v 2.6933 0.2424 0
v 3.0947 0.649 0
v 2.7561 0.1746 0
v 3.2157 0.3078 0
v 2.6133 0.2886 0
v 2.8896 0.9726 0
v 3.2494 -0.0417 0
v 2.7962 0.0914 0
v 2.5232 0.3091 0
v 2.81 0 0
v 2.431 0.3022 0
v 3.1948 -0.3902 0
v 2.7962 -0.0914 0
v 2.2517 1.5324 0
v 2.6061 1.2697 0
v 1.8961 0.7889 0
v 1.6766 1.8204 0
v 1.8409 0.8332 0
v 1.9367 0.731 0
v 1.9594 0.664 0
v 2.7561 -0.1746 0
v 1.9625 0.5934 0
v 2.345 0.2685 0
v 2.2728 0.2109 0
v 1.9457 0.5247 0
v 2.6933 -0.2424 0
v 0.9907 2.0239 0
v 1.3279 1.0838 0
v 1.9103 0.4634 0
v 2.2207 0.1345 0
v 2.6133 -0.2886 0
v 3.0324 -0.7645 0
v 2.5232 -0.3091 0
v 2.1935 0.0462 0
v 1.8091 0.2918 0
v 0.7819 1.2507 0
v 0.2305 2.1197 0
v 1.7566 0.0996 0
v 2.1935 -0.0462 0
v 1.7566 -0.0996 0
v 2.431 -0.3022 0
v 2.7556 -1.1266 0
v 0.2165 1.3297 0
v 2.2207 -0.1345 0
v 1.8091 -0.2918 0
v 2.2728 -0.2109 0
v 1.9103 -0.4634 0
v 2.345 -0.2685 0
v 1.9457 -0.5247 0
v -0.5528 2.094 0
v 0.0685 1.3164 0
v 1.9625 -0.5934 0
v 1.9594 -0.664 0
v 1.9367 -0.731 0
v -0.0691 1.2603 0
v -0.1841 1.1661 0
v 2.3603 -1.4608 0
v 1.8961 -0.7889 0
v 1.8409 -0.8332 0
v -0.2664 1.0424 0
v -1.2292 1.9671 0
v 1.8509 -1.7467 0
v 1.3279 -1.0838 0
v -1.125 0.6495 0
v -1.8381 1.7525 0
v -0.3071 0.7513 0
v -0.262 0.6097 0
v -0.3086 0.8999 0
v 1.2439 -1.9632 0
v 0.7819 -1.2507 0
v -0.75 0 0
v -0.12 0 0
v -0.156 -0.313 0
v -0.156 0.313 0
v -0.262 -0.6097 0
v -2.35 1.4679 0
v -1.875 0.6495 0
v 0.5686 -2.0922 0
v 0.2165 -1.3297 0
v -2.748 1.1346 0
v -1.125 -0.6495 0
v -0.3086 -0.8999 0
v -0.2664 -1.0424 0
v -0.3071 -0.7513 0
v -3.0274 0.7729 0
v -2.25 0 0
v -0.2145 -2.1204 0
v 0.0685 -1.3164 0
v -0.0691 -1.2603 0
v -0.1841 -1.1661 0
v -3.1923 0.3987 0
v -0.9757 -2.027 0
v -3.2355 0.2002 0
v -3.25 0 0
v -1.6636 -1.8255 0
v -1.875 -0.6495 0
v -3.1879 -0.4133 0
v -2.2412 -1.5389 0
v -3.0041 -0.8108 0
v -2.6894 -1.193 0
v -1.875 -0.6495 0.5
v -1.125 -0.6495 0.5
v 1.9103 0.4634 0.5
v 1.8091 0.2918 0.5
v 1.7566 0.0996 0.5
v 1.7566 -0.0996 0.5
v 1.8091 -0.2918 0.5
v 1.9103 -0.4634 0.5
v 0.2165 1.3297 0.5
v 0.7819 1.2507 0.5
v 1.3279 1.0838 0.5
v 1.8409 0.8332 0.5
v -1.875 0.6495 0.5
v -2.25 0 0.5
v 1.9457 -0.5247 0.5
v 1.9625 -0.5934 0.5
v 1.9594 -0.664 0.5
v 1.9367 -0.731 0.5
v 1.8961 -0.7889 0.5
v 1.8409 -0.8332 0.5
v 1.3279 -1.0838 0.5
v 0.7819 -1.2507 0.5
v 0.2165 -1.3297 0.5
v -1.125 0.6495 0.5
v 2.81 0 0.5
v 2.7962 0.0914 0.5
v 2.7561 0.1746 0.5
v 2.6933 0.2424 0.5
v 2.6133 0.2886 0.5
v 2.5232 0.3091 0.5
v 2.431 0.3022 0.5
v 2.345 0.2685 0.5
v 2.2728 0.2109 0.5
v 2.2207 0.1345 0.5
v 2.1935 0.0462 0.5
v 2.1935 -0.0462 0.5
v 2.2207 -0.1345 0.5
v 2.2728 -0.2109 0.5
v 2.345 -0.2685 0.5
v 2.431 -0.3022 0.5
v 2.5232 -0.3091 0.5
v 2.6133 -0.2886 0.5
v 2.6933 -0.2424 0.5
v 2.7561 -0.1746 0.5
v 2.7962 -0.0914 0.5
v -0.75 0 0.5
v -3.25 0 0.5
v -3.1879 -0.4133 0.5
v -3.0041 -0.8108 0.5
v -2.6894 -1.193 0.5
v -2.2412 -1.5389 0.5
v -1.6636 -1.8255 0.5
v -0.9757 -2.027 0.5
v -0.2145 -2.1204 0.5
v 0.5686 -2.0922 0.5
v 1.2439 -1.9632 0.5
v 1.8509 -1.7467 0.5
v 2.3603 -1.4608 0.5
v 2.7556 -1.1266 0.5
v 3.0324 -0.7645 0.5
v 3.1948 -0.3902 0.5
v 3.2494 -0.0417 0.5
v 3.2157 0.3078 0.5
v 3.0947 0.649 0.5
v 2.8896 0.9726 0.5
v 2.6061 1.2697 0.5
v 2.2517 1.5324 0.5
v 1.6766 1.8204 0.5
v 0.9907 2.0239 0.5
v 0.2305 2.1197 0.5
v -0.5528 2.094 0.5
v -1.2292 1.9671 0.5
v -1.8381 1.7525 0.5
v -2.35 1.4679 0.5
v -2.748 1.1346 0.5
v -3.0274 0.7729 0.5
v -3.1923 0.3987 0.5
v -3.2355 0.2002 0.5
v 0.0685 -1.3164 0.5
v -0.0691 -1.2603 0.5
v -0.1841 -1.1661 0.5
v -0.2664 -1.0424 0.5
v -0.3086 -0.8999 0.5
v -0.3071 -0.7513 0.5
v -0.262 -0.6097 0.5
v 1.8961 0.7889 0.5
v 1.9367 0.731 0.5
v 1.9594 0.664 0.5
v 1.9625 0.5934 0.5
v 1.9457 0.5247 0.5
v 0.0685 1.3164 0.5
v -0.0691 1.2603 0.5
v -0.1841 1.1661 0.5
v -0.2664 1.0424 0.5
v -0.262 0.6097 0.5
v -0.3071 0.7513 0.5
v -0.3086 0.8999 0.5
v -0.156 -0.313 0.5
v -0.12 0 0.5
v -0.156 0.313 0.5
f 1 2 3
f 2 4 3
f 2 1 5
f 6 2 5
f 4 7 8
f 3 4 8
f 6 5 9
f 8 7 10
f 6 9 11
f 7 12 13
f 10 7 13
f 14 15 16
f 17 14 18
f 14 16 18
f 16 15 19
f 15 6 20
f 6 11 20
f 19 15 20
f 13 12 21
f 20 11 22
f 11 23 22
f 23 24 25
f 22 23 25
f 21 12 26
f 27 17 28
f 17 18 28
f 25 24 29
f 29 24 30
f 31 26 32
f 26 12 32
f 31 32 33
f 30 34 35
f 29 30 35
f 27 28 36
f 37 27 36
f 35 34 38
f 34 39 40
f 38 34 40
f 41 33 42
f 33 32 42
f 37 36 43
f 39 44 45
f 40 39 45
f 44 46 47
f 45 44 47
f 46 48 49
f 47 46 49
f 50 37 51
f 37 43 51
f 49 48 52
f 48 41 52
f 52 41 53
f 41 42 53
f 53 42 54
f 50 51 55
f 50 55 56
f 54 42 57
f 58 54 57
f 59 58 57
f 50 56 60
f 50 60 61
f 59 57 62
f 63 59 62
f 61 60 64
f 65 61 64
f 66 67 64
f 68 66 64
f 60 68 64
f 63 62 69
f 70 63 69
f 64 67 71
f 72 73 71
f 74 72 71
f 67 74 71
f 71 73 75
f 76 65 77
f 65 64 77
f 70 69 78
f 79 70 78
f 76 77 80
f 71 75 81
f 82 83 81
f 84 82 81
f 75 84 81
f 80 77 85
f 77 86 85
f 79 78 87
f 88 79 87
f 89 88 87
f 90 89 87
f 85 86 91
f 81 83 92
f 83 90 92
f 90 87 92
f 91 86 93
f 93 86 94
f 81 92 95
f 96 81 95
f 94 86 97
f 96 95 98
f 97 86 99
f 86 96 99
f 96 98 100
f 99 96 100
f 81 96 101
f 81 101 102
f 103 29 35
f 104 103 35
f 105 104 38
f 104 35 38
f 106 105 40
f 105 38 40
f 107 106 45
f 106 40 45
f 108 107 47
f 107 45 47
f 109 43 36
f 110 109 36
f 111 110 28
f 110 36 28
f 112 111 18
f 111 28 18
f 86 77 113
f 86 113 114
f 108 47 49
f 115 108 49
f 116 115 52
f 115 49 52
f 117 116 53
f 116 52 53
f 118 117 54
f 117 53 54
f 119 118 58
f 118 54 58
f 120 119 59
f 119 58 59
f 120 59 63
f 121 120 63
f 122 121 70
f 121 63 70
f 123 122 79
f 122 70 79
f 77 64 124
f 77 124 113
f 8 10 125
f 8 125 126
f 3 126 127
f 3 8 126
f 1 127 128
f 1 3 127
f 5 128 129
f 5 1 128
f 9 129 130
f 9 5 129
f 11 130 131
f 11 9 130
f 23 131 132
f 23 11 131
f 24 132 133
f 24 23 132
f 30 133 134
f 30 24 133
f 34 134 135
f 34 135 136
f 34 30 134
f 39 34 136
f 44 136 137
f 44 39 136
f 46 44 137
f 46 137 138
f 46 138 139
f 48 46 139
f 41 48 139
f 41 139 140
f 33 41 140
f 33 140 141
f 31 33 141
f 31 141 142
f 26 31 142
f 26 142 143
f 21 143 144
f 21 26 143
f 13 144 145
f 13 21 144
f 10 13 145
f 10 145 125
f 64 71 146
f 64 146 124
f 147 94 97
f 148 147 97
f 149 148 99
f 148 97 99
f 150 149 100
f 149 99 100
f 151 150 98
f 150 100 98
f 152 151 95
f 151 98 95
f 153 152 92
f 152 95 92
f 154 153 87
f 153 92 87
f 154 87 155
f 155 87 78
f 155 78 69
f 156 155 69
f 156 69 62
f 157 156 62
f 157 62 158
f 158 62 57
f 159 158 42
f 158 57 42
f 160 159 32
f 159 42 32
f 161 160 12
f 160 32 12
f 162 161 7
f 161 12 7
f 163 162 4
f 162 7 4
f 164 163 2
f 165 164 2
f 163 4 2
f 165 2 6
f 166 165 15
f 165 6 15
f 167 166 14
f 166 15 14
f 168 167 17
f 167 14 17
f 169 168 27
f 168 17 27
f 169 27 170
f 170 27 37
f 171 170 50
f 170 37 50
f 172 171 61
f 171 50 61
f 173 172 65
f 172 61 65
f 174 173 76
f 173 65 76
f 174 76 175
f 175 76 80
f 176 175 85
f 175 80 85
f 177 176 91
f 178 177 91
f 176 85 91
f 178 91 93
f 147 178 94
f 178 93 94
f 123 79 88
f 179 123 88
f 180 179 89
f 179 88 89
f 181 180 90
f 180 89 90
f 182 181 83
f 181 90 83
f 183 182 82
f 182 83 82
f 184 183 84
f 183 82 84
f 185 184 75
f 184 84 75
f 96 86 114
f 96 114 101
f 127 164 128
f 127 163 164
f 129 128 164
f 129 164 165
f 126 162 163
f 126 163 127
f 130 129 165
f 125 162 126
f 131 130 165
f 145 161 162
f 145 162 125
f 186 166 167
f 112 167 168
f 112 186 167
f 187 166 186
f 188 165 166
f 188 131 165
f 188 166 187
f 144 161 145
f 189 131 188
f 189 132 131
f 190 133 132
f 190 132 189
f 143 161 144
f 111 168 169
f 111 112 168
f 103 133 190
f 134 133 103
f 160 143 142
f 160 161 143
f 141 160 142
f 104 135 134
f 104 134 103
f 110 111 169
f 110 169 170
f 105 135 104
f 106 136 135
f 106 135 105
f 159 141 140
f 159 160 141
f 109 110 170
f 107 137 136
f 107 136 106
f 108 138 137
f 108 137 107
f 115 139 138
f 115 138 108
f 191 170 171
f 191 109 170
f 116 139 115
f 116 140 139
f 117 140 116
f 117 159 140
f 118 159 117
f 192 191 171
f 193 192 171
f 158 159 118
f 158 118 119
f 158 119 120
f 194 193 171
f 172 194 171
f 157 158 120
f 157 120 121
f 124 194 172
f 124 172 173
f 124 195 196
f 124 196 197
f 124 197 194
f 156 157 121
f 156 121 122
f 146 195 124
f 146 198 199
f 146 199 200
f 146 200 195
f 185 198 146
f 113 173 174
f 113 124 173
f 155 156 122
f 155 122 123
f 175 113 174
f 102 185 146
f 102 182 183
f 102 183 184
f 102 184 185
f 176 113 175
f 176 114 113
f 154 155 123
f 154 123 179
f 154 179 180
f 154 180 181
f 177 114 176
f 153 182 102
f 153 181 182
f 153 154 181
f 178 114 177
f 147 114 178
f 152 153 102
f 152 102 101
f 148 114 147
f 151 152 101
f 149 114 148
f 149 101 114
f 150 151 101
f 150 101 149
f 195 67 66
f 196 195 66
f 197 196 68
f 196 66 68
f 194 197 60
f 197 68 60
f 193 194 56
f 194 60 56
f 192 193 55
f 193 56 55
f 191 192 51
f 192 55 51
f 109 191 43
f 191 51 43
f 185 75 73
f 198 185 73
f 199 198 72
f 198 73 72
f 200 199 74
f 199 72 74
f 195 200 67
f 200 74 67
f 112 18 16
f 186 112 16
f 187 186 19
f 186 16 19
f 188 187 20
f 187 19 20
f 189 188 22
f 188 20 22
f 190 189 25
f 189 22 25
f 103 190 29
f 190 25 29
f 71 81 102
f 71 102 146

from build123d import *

# Parameters (mm, degrees)
SKETCH1_RX          = 3.25
SKETCH1_RY          = 2.125
SKETCH1_R           = 0.31
BOSS_EXTRUDE1_DEPTH = 0.5


with BuildPart() as part:
    # Sketch1 → Boss-Extrude1 (new body)
    with BuildSketch(Plane.XY):
        with Locations(Location((0, 0), (0, 0, 180))):
            Ellipse(SKETCH1_RX, SKETCH1_RY)
        with Locations((2.5, 0)):
            Circle(SKETCH1_R, mode=Mode.SUBTRACT)
        Polygon((-0.75, 0), (-1.125, 0.649519053), (-1.875, 0.649519053), (-2.25, 0), (-1.875, -0.649519053), (-1.125, -0.649519053), align=None, mode=Mode.SUBTRACT)
        with BuildLine():
            ThreePointArc((1.91030814, 0.463425841), (1.75, 0), (1.91030814, -0.463425841))
            ThreePointArc((1.91030814, -0.463425841), (1.959449463, -0.664041312), (1.840876545, -0.833162274))
            ThreePointArc((1.840876545, -0.833162274), (1.05820698, -1.178058606), (0.216465271, -1.329703007))
            ThreePointArc((0.216465271, -1.329703007), (-0.229872347, -1.107325891), (-0.261988234, -0.609694078))
            ThreePointArc((-0.261988234, -0.609694078), (-0.12, 0), (-0.261988234, 0.609694078))
            ThreePointArc((-0.261988234, 0.609694078), (-0.229872347, 1.107325891), (0.216465271, 1.329703007))
            ThreePointArc((0.216465271, 1.329703007), (1.05820698, 1.178058606), (1.840876545, 0.833162274))
            ThreePointArc((1.840876545, 0.833162274), (1.959449463, 0.664041312), (1.91030814, 0.463425841))
        make_face(mode=Mode.SUBTRACT)
    extrude(amount=BOSS_EXTRUDE1_DEPTH)


solid = part.part
